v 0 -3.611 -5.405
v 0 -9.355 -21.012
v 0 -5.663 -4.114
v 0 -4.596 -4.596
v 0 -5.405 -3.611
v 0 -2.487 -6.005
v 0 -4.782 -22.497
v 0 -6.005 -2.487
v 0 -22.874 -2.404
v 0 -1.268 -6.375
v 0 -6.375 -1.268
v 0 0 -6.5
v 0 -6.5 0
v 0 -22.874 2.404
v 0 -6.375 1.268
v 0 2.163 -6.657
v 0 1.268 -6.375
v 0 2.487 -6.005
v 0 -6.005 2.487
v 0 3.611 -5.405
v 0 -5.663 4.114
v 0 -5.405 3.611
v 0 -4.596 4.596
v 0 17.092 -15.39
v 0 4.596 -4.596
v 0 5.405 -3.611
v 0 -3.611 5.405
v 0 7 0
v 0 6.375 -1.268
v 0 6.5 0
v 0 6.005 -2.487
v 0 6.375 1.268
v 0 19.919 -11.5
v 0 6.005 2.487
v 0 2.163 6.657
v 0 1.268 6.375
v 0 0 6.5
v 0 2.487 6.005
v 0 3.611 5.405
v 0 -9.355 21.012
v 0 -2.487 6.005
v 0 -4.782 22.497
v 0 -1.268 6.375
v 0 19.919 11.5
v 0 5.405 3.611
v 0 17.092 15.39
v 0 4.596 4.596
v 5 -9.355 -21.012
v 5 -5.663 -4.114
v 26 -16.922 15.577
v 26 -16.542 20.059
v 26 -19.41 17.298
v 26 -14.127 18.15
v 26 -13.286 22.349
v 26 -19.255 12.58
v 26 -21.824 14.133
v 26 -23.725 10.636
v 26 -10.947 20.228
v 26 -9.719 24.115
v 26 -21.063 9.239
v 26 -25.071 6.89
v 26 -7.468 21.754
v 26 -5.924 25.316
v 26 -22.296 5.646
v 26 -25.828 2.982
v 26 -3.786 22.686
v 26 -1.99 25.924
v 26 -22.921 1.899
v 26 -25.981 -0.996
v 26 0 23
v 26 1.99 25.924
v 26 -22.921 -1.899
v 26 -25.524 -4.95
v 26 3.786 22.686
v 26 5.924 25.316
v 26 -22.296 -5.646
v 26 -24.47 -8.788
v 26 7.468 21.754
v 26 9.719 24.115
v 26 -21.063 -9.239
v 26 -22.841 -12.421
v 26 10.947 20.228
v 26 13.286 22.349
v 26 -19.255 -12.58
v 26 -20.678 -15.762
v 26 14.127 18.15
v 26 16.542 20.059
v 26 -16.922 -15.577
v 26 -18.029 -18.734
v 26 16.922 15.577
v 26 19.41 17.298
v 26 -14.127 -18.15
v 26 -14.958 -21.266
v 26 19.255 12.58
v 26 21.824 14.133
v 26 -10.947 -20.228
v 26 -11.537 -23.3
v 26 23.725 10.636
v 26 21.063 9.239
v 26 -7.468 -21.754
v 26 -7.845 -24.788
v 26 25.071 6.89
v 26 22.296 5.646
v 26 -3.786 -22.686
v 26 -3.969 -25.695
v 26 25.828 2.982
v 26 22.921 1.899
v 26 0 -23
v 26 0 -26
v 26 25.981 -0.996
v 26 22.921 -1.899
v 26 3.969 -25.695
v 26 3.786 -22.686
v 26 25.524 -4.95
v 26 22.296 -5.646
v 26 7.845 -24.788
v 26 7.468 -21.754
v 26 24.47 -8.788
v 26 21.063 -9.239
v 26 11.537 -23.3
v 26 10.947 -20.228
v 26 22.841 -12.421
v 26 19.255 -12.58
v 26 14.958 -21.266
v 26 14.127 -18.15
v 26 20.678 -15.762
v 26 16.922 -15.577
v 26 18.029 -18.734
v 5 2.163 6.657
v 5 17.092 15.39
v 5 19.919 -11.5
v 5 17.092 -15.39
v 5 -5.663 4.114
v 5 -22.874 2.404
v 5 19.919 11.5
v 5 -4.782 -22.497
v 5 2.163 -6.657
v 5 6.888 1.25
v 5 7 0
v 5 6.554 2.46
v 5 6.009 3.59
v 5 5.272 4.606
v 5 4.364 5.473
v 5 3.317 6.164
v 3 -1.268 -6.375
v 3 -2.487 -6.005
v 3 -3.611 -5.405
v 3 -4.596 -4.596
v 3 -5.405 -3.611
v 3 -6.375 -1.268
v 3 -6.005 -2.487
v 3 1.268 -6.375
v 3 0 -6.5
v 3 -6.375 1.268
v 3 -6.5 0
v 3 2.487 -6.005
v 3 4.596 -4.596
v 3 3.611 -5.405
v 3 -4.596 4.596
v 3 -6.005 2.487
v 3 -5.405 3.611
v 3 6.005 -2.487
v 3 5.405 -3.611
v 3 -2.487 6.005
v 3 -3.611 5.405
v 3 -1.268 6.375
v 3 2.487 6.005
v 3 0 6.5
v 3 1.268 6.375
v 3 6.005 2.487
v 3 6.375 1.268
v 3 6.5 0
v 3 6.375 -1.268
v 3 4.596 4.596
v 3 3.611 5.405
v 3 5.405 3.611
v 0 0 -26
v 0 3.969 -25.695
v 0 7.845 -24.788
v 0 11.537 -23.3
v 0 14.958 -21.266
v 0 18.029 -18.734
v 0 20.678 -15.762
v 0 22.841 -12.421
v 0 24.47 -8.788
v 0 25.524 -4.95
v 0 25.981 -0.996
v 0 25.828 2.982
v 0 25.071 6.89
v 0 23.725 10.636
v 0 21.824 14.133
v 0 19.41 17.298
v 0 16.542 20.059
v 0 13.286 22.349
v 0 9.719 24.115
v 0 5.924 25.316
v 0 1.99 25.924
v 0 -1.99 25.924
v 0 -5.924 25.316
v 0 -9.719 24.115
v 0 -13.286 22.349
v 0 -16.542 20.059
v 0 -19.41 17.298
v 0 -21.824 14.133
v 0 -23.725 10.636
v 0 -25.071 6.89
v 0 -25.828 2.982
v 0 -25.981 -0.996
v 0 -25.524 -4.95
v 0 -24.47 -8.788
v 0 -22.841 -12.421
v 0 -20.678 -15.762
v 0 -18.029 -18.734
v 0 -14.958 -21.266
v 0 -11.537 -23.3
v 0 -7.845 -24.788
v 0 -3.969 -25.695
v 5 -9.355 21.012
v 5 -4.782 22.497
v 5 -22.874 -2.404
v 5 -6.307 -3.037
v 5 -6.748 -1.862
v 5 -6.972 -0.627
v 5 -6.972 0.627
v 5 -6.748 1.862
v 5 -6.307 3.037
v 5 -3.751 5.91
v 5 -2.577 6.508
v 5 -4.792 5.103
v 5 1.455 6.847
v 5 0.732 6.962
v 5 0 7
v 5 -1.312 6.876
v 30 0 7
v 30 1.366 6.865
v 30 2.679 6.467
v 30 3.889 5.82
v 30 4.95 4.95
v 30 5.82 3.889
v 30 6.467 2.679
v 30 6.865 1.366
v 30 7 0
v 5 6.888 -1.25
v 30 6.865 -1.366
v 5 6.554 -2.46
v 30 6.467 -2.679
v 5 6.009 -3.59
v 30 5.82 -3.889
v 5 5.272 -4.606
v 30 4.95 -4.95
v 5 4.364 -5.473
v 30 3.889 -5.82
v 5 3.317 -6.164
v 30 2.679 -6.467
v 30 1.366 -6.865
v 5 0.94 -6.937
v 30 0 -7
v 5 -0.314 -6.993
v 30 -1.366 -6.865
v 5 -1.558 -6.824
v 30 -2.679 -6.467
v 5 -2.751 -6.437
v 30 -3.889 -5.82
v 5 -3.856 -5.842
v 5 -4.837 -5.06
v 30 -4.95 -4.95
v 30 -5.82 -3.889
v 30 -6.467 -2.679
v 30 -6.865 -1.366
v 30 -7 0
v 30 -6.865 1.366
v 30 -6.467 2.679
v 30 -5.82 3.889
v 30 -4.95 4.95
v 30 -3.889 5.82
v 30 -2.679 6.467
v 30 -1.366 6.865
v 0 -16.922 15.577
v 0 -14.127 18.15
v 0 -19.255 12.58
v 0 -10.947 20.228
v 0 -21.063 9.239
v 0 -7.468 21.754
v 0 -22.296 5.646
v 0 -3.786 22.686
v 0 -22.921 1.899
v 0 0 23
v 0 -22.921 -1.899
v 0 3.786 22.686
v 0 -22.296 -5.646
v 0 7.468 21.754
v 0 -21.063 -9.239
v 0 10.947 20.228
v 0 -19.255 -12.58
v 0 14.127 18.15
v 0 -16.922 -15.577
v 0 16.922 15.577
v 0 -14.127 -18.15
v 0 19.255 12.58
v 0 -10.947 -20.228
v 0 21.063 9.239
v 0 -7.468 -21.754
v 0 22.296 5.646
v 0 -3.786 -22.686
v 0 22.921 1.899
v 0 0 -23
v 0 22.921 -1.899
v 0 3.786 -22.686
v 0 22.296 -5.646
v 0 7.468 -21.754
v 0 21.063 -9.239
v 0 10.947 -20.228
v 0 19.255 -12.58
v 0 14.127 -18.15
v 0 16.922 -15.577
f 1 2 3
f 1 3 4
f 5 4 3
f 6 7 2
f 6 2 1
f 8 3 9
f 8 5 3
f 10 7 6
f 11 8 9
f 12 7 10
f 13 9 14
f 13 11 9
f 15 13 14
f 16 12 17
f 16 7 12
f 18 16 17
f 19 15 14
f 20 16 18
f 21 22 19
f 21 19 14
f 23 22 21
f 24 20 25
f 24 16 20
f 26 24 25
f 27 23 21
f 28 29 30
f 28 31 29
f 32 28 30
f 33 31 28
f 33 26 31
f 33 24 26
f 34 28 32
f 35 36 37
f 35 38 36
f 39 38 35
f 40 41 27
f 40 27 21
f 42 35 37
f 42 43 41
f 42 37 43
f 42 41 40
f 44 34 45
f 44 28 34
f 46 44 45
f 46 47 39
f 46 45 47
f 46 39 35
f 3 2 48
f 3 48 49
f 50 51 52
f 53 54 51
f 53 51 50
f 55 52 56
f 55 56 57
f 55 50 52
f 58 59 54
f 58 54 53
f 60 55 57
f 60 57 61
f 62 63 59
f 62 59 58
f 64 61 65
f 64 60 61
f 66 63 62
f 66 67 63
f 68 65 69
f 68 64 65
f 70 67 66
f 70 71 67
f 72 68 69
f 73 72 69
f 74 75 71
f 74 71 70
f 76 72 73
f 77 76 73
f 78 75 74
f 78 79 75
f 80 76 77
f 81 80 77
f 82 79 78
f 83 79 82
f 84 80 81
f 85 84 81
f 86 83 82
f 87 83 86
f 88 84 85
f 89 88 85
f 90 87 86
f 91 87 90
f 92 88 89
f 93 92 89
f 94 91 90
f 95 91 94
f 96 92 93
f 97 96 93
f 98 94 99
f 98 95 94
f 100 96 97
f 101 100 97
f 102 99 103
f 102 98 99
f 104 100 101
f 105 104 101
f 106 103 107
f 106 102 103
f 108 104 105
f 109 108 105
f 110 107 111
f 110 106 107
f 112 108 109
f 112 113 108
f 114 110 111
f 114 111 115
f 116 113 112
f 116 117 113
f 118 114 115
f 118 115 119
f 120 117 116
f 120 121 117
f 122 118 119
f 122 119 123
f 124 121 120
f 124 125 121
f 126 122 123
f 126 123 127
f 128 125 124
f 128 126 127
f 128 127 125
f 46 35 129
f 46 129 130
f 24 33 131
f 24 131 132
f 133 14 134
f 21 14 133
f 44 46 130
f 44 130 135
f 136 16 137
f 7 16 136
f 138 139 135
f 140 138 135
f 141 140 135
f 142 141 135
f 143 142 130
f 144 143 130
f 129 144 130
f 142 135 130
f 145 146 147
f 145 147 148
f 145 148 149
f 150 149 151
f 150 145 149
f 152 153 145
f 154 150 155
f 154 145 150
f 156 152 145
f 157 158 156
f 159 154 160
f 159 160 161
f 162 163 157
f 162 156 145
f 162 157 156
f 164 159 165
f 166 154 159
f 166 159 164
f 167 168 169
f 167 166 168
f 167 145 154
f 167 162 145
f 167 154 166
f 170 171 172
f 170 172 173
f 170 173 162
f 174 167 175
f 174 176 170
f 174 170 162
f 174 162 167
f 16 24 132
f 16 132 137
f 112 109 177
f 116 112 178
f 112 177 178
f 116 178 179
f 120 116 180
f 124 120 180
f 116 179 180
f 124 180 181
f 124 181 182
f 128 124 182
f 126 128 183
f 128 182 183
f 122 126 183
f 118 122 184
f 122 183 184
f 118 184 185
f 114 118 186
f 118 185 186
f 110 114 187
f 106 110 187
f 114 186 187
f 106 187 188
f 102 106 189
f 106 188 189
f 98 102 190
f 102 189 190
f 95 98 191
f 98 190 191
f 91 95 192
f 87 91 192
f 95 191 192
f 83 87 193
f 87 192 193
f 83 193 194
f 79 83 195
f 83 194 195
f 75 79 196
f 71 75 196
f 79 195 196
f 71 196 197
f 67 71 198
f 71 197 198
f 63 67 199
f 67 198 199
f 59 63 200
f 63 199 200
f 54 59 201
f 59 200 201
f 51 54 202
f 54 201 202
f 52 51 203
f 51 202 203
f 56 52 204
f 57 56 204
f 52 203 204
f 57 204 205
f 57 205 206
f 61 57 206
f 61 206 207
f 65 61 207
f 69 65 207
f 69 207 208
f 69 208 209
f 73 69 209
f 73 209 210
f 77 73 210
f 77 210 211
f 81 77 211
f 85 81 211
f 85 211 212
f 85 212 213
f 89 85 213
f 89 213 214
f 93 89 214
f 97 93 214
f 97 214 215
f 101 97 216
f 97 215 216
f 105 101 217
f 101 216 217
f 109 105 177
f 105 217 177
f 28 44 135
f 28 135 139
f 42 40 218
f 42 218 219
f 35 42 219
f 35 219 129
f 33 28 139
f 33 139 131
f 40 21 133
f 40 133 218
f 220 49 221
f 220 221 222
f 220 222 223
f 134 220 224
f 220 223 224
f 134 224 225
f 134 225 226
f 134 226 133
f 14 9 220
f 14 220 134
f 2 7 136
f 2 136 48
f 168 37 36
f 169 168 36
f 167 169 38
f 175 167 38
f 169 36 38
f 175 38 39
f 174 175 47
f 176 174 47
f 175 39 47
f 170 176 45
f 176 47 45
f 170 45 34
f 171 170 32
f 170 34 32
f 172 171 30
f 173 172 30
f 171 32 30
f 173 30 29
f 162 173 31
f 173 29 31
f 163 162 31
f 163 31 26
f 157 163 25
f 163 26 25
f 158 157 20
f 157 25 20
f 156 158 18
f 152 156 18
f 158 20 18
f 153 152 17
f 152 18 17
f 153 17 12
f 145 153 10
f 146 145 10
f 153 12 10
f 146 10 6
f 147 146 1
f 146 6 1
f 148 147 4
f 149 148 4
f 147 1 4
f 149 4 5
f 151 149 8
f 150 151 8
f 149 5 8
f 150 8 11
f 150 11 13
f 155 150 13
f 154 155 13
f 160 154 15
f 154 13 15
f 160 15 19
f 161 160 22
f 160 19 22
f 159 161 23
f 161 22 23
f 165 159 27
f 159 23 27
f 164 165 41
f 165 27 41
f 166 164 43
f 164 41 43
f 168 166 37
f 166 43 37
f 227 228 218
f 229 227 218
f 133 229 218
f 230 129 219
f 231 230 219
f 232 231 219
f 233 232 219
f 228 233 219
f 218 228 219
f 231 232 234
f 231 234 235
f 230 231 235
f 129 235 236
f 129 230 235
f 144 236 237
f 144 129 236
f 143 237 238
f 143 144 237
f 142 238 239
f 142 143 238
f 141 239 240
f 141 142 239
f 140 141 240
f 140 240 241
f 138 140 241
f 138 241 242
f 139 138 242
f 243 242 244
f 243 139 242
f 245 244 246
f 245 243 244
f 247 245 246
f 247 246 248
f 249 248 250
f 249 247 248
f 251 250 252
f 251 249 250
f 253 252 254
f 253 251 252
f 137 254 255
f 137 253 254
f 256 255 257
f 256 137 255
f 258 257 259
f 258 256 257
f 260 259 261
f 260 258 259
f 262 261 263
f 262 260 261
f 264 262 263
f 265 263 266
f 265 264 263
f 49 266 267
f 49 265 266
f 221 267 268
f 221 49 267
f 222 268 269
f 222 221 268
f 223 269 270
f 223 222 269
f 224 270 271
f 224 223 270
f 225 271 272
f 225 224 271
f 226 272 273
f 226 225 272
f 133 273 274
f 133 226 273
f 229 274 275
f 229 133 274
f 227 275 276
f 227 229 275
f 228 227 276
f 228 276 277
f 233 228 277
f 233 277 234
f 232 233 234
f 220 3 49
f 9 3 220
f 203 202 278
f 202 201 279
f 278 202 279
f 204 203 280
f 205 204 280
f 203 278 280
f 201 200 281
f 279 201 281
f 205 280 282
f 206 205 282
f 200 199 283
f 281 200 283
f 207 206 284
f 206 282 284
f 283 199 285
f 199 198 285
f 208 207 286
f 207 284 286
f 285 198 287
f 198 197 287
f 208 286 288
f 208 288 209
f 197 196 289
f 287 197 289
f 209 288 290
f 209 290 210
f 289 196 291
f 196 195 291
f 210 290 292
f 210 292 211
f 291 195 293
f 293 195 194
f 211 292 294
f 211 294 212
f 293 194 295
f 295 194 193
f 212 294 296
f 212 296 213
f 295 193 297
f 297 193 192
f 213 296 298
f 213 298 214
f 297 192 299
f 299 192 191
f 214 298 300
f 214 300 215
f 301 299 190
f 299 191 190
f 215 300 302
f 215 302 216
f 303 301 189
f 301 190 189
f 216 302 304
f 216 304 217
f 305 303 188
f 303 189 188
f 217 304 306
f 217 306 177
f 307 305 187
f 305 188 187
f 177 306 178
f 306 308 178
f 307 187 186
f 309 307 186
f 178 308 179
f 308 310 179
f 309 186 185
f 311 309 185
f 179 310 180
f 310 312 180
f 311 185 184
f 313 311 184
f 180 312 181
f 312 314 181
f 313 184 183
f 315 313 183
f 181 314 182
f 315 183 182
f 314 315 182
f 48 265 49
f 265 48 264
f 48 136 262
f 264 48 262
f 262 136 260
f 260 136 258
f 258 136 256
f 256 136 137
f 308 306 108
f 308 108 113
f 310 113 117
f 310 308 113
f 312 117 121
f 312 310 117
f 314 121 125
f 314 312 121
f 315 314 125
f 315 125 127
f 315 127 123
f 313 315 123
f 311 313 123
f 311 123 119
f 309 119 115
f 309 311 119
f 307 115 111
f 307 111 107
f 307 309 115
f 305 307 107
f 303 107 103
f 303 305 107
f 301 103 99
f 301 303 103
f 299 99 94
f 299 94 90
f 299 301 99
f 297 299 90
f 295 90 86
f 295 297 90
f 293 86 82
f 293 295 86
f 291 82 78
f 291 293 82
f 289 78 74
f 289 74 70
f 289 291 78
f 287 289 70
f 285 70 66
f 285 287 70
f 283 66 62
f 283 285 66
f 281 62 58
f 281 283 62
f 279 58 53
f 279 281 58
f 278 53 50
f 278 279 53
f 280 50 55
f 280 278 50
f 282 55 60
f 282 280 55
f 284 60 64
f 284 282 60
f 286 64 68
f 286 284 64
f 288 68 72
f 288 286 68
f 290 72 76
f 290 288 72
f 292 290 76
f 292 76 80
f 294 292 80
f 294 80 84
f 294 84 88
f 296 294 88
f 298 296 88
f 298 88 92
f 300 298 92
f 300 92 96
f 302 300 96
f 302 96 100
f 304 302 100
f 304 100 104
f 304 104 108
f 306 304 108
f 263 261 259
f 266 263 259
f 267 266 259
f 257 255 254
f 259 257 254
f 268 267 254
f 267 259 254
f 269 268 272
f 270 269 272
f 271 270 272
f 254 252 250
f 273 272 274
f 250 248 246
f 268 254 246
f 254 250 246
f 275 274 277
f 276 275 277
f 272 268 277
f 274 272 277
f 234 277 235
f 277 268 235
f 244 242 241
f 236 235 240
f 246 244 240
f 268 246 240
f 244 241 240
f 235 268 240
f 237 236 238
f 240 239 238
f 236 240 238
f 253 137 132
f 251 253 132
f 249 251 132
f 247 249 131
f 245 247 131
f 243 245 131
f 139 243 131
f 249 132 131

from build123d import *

# Parameters (mm, degrees)
SKETCH_2_R          = 26
SKETCH_2_R_2        = 23
EXTRUDE_1_DEPTH     = 26
SKETCH_4_R          = 7
EXTRUDE_1_2_DEPTH   = 30
EXTRUDE_2_DEPTH     = 5
SKETCH_7_R          = 6.5
CUT_EXTRUDE_1_DEPTH = 3


with BuildPart() as part:
    # Эскиз2 → Extrude 1 (new body)
    with BuildSketch(Plane(origin=(0, 0, 0), x_dir=(0, 0, -1), z_dir=(1, 0, 0))):
        Circle(SKETCH_2_R)
        Circle(SKETCH_2_R_2, mode=Mode.SUBTRACT)
    extrude(amount=EXTRUDE_1_DEPTH)


with BuildPart() as body_2:
    # Эскиз4 → Extrude 1 2 (new body)
    with BuildSketch(Plane.ZY):
        Circle(SKETCH_4_R)
    extrude(amount=-EXTRUDE_1_2_DEPTH)

    # Эскиз6 → Бобышка-Вытянуть2 (add)
    with BuildSketch(Plane.ZY):
        with BuildLine():
            ThreePointArc((-6.657395614, 2.163118961), (-4.114496766, 5.663118961), (0, 7))
            Line((0, 7), (-11.5, 19.918584287))
            Line((-11.5, 19.918584287), (-15.390003946, 17.092330986))
            Line((-15.390003946, 17.092330986), (-6.657395614, 2.163118961))
        make_face()
        with BuildLine():
            Line((11.5, 19.918584287), (0, 7))
            ThreePointArc((0, 7), (4.114496766, 5.663118961), (6.657395614, 2.163118961))
            Line((6.657395614, 2.163118961), (15.390003946, 17.092330986))
            Line((15.390003946, 17.092330986), (11.5, 19.918584287))
        make_face()
        with BuildLine():
            Line((22.497394817, -4.781968889), (6.657395614, 2.163118961))
            ThreePointArc((6.657395614, 2.163118961), (6.913818384, 1.095041255), (7, 0))
            ThreePointArc((7, 0), (6.237045669, -3.177933498), (4.114496766, -5.663118961))
            Line((4.114496766, -5.663118961), (21.011545526, -9.354942791))
            Line((21.011545526, -9.354942791), (22.497394817, -4.781968889))
        make_face()
        with BuildLine():
            ThreePointArc((4.114496766, -5.663118961), (0, -7), (-4.114496766, -5.663118961))
            Line((-4.114496766, -5.663118961), (-2.404154655, -22.874003593))
            Line((-2.404154655, -22.874003593), (2.404154655, -22.874003593))
            Line((2.404154655, -22.874003593), (4.114496766, -5.663118961))
        make_face()
        with BuildLine():
            ThreePointArc((-4.114496766, -5.663118961), (-6.657395614, -2.163118961), (-6.657395614, 2.163118961))
            Line((-6.657395614, 2.163118961), (-22.497394817, -4.781968889))
            Line((-22.497394817, -4.781968889), (-21.011545526, -9.354942791))
            Line((-21.011545526, -9.354942791), (-4.114496766, -5.663118961))
        make_face()
    extrude(amount=-EXTRUDE_2_DEPTH)

    # Эскиз7 → Вырез-Вытянуть1 (cut)
    with BuildSketch(Plane.ZY):
        Circle(SKETCH_7_R)
    extrude(amount=-CUT_EXTRUDE_1_DEPTH, mode=Mode.SUBTRACT)


solid = Compound([part.part, body_2.part])
